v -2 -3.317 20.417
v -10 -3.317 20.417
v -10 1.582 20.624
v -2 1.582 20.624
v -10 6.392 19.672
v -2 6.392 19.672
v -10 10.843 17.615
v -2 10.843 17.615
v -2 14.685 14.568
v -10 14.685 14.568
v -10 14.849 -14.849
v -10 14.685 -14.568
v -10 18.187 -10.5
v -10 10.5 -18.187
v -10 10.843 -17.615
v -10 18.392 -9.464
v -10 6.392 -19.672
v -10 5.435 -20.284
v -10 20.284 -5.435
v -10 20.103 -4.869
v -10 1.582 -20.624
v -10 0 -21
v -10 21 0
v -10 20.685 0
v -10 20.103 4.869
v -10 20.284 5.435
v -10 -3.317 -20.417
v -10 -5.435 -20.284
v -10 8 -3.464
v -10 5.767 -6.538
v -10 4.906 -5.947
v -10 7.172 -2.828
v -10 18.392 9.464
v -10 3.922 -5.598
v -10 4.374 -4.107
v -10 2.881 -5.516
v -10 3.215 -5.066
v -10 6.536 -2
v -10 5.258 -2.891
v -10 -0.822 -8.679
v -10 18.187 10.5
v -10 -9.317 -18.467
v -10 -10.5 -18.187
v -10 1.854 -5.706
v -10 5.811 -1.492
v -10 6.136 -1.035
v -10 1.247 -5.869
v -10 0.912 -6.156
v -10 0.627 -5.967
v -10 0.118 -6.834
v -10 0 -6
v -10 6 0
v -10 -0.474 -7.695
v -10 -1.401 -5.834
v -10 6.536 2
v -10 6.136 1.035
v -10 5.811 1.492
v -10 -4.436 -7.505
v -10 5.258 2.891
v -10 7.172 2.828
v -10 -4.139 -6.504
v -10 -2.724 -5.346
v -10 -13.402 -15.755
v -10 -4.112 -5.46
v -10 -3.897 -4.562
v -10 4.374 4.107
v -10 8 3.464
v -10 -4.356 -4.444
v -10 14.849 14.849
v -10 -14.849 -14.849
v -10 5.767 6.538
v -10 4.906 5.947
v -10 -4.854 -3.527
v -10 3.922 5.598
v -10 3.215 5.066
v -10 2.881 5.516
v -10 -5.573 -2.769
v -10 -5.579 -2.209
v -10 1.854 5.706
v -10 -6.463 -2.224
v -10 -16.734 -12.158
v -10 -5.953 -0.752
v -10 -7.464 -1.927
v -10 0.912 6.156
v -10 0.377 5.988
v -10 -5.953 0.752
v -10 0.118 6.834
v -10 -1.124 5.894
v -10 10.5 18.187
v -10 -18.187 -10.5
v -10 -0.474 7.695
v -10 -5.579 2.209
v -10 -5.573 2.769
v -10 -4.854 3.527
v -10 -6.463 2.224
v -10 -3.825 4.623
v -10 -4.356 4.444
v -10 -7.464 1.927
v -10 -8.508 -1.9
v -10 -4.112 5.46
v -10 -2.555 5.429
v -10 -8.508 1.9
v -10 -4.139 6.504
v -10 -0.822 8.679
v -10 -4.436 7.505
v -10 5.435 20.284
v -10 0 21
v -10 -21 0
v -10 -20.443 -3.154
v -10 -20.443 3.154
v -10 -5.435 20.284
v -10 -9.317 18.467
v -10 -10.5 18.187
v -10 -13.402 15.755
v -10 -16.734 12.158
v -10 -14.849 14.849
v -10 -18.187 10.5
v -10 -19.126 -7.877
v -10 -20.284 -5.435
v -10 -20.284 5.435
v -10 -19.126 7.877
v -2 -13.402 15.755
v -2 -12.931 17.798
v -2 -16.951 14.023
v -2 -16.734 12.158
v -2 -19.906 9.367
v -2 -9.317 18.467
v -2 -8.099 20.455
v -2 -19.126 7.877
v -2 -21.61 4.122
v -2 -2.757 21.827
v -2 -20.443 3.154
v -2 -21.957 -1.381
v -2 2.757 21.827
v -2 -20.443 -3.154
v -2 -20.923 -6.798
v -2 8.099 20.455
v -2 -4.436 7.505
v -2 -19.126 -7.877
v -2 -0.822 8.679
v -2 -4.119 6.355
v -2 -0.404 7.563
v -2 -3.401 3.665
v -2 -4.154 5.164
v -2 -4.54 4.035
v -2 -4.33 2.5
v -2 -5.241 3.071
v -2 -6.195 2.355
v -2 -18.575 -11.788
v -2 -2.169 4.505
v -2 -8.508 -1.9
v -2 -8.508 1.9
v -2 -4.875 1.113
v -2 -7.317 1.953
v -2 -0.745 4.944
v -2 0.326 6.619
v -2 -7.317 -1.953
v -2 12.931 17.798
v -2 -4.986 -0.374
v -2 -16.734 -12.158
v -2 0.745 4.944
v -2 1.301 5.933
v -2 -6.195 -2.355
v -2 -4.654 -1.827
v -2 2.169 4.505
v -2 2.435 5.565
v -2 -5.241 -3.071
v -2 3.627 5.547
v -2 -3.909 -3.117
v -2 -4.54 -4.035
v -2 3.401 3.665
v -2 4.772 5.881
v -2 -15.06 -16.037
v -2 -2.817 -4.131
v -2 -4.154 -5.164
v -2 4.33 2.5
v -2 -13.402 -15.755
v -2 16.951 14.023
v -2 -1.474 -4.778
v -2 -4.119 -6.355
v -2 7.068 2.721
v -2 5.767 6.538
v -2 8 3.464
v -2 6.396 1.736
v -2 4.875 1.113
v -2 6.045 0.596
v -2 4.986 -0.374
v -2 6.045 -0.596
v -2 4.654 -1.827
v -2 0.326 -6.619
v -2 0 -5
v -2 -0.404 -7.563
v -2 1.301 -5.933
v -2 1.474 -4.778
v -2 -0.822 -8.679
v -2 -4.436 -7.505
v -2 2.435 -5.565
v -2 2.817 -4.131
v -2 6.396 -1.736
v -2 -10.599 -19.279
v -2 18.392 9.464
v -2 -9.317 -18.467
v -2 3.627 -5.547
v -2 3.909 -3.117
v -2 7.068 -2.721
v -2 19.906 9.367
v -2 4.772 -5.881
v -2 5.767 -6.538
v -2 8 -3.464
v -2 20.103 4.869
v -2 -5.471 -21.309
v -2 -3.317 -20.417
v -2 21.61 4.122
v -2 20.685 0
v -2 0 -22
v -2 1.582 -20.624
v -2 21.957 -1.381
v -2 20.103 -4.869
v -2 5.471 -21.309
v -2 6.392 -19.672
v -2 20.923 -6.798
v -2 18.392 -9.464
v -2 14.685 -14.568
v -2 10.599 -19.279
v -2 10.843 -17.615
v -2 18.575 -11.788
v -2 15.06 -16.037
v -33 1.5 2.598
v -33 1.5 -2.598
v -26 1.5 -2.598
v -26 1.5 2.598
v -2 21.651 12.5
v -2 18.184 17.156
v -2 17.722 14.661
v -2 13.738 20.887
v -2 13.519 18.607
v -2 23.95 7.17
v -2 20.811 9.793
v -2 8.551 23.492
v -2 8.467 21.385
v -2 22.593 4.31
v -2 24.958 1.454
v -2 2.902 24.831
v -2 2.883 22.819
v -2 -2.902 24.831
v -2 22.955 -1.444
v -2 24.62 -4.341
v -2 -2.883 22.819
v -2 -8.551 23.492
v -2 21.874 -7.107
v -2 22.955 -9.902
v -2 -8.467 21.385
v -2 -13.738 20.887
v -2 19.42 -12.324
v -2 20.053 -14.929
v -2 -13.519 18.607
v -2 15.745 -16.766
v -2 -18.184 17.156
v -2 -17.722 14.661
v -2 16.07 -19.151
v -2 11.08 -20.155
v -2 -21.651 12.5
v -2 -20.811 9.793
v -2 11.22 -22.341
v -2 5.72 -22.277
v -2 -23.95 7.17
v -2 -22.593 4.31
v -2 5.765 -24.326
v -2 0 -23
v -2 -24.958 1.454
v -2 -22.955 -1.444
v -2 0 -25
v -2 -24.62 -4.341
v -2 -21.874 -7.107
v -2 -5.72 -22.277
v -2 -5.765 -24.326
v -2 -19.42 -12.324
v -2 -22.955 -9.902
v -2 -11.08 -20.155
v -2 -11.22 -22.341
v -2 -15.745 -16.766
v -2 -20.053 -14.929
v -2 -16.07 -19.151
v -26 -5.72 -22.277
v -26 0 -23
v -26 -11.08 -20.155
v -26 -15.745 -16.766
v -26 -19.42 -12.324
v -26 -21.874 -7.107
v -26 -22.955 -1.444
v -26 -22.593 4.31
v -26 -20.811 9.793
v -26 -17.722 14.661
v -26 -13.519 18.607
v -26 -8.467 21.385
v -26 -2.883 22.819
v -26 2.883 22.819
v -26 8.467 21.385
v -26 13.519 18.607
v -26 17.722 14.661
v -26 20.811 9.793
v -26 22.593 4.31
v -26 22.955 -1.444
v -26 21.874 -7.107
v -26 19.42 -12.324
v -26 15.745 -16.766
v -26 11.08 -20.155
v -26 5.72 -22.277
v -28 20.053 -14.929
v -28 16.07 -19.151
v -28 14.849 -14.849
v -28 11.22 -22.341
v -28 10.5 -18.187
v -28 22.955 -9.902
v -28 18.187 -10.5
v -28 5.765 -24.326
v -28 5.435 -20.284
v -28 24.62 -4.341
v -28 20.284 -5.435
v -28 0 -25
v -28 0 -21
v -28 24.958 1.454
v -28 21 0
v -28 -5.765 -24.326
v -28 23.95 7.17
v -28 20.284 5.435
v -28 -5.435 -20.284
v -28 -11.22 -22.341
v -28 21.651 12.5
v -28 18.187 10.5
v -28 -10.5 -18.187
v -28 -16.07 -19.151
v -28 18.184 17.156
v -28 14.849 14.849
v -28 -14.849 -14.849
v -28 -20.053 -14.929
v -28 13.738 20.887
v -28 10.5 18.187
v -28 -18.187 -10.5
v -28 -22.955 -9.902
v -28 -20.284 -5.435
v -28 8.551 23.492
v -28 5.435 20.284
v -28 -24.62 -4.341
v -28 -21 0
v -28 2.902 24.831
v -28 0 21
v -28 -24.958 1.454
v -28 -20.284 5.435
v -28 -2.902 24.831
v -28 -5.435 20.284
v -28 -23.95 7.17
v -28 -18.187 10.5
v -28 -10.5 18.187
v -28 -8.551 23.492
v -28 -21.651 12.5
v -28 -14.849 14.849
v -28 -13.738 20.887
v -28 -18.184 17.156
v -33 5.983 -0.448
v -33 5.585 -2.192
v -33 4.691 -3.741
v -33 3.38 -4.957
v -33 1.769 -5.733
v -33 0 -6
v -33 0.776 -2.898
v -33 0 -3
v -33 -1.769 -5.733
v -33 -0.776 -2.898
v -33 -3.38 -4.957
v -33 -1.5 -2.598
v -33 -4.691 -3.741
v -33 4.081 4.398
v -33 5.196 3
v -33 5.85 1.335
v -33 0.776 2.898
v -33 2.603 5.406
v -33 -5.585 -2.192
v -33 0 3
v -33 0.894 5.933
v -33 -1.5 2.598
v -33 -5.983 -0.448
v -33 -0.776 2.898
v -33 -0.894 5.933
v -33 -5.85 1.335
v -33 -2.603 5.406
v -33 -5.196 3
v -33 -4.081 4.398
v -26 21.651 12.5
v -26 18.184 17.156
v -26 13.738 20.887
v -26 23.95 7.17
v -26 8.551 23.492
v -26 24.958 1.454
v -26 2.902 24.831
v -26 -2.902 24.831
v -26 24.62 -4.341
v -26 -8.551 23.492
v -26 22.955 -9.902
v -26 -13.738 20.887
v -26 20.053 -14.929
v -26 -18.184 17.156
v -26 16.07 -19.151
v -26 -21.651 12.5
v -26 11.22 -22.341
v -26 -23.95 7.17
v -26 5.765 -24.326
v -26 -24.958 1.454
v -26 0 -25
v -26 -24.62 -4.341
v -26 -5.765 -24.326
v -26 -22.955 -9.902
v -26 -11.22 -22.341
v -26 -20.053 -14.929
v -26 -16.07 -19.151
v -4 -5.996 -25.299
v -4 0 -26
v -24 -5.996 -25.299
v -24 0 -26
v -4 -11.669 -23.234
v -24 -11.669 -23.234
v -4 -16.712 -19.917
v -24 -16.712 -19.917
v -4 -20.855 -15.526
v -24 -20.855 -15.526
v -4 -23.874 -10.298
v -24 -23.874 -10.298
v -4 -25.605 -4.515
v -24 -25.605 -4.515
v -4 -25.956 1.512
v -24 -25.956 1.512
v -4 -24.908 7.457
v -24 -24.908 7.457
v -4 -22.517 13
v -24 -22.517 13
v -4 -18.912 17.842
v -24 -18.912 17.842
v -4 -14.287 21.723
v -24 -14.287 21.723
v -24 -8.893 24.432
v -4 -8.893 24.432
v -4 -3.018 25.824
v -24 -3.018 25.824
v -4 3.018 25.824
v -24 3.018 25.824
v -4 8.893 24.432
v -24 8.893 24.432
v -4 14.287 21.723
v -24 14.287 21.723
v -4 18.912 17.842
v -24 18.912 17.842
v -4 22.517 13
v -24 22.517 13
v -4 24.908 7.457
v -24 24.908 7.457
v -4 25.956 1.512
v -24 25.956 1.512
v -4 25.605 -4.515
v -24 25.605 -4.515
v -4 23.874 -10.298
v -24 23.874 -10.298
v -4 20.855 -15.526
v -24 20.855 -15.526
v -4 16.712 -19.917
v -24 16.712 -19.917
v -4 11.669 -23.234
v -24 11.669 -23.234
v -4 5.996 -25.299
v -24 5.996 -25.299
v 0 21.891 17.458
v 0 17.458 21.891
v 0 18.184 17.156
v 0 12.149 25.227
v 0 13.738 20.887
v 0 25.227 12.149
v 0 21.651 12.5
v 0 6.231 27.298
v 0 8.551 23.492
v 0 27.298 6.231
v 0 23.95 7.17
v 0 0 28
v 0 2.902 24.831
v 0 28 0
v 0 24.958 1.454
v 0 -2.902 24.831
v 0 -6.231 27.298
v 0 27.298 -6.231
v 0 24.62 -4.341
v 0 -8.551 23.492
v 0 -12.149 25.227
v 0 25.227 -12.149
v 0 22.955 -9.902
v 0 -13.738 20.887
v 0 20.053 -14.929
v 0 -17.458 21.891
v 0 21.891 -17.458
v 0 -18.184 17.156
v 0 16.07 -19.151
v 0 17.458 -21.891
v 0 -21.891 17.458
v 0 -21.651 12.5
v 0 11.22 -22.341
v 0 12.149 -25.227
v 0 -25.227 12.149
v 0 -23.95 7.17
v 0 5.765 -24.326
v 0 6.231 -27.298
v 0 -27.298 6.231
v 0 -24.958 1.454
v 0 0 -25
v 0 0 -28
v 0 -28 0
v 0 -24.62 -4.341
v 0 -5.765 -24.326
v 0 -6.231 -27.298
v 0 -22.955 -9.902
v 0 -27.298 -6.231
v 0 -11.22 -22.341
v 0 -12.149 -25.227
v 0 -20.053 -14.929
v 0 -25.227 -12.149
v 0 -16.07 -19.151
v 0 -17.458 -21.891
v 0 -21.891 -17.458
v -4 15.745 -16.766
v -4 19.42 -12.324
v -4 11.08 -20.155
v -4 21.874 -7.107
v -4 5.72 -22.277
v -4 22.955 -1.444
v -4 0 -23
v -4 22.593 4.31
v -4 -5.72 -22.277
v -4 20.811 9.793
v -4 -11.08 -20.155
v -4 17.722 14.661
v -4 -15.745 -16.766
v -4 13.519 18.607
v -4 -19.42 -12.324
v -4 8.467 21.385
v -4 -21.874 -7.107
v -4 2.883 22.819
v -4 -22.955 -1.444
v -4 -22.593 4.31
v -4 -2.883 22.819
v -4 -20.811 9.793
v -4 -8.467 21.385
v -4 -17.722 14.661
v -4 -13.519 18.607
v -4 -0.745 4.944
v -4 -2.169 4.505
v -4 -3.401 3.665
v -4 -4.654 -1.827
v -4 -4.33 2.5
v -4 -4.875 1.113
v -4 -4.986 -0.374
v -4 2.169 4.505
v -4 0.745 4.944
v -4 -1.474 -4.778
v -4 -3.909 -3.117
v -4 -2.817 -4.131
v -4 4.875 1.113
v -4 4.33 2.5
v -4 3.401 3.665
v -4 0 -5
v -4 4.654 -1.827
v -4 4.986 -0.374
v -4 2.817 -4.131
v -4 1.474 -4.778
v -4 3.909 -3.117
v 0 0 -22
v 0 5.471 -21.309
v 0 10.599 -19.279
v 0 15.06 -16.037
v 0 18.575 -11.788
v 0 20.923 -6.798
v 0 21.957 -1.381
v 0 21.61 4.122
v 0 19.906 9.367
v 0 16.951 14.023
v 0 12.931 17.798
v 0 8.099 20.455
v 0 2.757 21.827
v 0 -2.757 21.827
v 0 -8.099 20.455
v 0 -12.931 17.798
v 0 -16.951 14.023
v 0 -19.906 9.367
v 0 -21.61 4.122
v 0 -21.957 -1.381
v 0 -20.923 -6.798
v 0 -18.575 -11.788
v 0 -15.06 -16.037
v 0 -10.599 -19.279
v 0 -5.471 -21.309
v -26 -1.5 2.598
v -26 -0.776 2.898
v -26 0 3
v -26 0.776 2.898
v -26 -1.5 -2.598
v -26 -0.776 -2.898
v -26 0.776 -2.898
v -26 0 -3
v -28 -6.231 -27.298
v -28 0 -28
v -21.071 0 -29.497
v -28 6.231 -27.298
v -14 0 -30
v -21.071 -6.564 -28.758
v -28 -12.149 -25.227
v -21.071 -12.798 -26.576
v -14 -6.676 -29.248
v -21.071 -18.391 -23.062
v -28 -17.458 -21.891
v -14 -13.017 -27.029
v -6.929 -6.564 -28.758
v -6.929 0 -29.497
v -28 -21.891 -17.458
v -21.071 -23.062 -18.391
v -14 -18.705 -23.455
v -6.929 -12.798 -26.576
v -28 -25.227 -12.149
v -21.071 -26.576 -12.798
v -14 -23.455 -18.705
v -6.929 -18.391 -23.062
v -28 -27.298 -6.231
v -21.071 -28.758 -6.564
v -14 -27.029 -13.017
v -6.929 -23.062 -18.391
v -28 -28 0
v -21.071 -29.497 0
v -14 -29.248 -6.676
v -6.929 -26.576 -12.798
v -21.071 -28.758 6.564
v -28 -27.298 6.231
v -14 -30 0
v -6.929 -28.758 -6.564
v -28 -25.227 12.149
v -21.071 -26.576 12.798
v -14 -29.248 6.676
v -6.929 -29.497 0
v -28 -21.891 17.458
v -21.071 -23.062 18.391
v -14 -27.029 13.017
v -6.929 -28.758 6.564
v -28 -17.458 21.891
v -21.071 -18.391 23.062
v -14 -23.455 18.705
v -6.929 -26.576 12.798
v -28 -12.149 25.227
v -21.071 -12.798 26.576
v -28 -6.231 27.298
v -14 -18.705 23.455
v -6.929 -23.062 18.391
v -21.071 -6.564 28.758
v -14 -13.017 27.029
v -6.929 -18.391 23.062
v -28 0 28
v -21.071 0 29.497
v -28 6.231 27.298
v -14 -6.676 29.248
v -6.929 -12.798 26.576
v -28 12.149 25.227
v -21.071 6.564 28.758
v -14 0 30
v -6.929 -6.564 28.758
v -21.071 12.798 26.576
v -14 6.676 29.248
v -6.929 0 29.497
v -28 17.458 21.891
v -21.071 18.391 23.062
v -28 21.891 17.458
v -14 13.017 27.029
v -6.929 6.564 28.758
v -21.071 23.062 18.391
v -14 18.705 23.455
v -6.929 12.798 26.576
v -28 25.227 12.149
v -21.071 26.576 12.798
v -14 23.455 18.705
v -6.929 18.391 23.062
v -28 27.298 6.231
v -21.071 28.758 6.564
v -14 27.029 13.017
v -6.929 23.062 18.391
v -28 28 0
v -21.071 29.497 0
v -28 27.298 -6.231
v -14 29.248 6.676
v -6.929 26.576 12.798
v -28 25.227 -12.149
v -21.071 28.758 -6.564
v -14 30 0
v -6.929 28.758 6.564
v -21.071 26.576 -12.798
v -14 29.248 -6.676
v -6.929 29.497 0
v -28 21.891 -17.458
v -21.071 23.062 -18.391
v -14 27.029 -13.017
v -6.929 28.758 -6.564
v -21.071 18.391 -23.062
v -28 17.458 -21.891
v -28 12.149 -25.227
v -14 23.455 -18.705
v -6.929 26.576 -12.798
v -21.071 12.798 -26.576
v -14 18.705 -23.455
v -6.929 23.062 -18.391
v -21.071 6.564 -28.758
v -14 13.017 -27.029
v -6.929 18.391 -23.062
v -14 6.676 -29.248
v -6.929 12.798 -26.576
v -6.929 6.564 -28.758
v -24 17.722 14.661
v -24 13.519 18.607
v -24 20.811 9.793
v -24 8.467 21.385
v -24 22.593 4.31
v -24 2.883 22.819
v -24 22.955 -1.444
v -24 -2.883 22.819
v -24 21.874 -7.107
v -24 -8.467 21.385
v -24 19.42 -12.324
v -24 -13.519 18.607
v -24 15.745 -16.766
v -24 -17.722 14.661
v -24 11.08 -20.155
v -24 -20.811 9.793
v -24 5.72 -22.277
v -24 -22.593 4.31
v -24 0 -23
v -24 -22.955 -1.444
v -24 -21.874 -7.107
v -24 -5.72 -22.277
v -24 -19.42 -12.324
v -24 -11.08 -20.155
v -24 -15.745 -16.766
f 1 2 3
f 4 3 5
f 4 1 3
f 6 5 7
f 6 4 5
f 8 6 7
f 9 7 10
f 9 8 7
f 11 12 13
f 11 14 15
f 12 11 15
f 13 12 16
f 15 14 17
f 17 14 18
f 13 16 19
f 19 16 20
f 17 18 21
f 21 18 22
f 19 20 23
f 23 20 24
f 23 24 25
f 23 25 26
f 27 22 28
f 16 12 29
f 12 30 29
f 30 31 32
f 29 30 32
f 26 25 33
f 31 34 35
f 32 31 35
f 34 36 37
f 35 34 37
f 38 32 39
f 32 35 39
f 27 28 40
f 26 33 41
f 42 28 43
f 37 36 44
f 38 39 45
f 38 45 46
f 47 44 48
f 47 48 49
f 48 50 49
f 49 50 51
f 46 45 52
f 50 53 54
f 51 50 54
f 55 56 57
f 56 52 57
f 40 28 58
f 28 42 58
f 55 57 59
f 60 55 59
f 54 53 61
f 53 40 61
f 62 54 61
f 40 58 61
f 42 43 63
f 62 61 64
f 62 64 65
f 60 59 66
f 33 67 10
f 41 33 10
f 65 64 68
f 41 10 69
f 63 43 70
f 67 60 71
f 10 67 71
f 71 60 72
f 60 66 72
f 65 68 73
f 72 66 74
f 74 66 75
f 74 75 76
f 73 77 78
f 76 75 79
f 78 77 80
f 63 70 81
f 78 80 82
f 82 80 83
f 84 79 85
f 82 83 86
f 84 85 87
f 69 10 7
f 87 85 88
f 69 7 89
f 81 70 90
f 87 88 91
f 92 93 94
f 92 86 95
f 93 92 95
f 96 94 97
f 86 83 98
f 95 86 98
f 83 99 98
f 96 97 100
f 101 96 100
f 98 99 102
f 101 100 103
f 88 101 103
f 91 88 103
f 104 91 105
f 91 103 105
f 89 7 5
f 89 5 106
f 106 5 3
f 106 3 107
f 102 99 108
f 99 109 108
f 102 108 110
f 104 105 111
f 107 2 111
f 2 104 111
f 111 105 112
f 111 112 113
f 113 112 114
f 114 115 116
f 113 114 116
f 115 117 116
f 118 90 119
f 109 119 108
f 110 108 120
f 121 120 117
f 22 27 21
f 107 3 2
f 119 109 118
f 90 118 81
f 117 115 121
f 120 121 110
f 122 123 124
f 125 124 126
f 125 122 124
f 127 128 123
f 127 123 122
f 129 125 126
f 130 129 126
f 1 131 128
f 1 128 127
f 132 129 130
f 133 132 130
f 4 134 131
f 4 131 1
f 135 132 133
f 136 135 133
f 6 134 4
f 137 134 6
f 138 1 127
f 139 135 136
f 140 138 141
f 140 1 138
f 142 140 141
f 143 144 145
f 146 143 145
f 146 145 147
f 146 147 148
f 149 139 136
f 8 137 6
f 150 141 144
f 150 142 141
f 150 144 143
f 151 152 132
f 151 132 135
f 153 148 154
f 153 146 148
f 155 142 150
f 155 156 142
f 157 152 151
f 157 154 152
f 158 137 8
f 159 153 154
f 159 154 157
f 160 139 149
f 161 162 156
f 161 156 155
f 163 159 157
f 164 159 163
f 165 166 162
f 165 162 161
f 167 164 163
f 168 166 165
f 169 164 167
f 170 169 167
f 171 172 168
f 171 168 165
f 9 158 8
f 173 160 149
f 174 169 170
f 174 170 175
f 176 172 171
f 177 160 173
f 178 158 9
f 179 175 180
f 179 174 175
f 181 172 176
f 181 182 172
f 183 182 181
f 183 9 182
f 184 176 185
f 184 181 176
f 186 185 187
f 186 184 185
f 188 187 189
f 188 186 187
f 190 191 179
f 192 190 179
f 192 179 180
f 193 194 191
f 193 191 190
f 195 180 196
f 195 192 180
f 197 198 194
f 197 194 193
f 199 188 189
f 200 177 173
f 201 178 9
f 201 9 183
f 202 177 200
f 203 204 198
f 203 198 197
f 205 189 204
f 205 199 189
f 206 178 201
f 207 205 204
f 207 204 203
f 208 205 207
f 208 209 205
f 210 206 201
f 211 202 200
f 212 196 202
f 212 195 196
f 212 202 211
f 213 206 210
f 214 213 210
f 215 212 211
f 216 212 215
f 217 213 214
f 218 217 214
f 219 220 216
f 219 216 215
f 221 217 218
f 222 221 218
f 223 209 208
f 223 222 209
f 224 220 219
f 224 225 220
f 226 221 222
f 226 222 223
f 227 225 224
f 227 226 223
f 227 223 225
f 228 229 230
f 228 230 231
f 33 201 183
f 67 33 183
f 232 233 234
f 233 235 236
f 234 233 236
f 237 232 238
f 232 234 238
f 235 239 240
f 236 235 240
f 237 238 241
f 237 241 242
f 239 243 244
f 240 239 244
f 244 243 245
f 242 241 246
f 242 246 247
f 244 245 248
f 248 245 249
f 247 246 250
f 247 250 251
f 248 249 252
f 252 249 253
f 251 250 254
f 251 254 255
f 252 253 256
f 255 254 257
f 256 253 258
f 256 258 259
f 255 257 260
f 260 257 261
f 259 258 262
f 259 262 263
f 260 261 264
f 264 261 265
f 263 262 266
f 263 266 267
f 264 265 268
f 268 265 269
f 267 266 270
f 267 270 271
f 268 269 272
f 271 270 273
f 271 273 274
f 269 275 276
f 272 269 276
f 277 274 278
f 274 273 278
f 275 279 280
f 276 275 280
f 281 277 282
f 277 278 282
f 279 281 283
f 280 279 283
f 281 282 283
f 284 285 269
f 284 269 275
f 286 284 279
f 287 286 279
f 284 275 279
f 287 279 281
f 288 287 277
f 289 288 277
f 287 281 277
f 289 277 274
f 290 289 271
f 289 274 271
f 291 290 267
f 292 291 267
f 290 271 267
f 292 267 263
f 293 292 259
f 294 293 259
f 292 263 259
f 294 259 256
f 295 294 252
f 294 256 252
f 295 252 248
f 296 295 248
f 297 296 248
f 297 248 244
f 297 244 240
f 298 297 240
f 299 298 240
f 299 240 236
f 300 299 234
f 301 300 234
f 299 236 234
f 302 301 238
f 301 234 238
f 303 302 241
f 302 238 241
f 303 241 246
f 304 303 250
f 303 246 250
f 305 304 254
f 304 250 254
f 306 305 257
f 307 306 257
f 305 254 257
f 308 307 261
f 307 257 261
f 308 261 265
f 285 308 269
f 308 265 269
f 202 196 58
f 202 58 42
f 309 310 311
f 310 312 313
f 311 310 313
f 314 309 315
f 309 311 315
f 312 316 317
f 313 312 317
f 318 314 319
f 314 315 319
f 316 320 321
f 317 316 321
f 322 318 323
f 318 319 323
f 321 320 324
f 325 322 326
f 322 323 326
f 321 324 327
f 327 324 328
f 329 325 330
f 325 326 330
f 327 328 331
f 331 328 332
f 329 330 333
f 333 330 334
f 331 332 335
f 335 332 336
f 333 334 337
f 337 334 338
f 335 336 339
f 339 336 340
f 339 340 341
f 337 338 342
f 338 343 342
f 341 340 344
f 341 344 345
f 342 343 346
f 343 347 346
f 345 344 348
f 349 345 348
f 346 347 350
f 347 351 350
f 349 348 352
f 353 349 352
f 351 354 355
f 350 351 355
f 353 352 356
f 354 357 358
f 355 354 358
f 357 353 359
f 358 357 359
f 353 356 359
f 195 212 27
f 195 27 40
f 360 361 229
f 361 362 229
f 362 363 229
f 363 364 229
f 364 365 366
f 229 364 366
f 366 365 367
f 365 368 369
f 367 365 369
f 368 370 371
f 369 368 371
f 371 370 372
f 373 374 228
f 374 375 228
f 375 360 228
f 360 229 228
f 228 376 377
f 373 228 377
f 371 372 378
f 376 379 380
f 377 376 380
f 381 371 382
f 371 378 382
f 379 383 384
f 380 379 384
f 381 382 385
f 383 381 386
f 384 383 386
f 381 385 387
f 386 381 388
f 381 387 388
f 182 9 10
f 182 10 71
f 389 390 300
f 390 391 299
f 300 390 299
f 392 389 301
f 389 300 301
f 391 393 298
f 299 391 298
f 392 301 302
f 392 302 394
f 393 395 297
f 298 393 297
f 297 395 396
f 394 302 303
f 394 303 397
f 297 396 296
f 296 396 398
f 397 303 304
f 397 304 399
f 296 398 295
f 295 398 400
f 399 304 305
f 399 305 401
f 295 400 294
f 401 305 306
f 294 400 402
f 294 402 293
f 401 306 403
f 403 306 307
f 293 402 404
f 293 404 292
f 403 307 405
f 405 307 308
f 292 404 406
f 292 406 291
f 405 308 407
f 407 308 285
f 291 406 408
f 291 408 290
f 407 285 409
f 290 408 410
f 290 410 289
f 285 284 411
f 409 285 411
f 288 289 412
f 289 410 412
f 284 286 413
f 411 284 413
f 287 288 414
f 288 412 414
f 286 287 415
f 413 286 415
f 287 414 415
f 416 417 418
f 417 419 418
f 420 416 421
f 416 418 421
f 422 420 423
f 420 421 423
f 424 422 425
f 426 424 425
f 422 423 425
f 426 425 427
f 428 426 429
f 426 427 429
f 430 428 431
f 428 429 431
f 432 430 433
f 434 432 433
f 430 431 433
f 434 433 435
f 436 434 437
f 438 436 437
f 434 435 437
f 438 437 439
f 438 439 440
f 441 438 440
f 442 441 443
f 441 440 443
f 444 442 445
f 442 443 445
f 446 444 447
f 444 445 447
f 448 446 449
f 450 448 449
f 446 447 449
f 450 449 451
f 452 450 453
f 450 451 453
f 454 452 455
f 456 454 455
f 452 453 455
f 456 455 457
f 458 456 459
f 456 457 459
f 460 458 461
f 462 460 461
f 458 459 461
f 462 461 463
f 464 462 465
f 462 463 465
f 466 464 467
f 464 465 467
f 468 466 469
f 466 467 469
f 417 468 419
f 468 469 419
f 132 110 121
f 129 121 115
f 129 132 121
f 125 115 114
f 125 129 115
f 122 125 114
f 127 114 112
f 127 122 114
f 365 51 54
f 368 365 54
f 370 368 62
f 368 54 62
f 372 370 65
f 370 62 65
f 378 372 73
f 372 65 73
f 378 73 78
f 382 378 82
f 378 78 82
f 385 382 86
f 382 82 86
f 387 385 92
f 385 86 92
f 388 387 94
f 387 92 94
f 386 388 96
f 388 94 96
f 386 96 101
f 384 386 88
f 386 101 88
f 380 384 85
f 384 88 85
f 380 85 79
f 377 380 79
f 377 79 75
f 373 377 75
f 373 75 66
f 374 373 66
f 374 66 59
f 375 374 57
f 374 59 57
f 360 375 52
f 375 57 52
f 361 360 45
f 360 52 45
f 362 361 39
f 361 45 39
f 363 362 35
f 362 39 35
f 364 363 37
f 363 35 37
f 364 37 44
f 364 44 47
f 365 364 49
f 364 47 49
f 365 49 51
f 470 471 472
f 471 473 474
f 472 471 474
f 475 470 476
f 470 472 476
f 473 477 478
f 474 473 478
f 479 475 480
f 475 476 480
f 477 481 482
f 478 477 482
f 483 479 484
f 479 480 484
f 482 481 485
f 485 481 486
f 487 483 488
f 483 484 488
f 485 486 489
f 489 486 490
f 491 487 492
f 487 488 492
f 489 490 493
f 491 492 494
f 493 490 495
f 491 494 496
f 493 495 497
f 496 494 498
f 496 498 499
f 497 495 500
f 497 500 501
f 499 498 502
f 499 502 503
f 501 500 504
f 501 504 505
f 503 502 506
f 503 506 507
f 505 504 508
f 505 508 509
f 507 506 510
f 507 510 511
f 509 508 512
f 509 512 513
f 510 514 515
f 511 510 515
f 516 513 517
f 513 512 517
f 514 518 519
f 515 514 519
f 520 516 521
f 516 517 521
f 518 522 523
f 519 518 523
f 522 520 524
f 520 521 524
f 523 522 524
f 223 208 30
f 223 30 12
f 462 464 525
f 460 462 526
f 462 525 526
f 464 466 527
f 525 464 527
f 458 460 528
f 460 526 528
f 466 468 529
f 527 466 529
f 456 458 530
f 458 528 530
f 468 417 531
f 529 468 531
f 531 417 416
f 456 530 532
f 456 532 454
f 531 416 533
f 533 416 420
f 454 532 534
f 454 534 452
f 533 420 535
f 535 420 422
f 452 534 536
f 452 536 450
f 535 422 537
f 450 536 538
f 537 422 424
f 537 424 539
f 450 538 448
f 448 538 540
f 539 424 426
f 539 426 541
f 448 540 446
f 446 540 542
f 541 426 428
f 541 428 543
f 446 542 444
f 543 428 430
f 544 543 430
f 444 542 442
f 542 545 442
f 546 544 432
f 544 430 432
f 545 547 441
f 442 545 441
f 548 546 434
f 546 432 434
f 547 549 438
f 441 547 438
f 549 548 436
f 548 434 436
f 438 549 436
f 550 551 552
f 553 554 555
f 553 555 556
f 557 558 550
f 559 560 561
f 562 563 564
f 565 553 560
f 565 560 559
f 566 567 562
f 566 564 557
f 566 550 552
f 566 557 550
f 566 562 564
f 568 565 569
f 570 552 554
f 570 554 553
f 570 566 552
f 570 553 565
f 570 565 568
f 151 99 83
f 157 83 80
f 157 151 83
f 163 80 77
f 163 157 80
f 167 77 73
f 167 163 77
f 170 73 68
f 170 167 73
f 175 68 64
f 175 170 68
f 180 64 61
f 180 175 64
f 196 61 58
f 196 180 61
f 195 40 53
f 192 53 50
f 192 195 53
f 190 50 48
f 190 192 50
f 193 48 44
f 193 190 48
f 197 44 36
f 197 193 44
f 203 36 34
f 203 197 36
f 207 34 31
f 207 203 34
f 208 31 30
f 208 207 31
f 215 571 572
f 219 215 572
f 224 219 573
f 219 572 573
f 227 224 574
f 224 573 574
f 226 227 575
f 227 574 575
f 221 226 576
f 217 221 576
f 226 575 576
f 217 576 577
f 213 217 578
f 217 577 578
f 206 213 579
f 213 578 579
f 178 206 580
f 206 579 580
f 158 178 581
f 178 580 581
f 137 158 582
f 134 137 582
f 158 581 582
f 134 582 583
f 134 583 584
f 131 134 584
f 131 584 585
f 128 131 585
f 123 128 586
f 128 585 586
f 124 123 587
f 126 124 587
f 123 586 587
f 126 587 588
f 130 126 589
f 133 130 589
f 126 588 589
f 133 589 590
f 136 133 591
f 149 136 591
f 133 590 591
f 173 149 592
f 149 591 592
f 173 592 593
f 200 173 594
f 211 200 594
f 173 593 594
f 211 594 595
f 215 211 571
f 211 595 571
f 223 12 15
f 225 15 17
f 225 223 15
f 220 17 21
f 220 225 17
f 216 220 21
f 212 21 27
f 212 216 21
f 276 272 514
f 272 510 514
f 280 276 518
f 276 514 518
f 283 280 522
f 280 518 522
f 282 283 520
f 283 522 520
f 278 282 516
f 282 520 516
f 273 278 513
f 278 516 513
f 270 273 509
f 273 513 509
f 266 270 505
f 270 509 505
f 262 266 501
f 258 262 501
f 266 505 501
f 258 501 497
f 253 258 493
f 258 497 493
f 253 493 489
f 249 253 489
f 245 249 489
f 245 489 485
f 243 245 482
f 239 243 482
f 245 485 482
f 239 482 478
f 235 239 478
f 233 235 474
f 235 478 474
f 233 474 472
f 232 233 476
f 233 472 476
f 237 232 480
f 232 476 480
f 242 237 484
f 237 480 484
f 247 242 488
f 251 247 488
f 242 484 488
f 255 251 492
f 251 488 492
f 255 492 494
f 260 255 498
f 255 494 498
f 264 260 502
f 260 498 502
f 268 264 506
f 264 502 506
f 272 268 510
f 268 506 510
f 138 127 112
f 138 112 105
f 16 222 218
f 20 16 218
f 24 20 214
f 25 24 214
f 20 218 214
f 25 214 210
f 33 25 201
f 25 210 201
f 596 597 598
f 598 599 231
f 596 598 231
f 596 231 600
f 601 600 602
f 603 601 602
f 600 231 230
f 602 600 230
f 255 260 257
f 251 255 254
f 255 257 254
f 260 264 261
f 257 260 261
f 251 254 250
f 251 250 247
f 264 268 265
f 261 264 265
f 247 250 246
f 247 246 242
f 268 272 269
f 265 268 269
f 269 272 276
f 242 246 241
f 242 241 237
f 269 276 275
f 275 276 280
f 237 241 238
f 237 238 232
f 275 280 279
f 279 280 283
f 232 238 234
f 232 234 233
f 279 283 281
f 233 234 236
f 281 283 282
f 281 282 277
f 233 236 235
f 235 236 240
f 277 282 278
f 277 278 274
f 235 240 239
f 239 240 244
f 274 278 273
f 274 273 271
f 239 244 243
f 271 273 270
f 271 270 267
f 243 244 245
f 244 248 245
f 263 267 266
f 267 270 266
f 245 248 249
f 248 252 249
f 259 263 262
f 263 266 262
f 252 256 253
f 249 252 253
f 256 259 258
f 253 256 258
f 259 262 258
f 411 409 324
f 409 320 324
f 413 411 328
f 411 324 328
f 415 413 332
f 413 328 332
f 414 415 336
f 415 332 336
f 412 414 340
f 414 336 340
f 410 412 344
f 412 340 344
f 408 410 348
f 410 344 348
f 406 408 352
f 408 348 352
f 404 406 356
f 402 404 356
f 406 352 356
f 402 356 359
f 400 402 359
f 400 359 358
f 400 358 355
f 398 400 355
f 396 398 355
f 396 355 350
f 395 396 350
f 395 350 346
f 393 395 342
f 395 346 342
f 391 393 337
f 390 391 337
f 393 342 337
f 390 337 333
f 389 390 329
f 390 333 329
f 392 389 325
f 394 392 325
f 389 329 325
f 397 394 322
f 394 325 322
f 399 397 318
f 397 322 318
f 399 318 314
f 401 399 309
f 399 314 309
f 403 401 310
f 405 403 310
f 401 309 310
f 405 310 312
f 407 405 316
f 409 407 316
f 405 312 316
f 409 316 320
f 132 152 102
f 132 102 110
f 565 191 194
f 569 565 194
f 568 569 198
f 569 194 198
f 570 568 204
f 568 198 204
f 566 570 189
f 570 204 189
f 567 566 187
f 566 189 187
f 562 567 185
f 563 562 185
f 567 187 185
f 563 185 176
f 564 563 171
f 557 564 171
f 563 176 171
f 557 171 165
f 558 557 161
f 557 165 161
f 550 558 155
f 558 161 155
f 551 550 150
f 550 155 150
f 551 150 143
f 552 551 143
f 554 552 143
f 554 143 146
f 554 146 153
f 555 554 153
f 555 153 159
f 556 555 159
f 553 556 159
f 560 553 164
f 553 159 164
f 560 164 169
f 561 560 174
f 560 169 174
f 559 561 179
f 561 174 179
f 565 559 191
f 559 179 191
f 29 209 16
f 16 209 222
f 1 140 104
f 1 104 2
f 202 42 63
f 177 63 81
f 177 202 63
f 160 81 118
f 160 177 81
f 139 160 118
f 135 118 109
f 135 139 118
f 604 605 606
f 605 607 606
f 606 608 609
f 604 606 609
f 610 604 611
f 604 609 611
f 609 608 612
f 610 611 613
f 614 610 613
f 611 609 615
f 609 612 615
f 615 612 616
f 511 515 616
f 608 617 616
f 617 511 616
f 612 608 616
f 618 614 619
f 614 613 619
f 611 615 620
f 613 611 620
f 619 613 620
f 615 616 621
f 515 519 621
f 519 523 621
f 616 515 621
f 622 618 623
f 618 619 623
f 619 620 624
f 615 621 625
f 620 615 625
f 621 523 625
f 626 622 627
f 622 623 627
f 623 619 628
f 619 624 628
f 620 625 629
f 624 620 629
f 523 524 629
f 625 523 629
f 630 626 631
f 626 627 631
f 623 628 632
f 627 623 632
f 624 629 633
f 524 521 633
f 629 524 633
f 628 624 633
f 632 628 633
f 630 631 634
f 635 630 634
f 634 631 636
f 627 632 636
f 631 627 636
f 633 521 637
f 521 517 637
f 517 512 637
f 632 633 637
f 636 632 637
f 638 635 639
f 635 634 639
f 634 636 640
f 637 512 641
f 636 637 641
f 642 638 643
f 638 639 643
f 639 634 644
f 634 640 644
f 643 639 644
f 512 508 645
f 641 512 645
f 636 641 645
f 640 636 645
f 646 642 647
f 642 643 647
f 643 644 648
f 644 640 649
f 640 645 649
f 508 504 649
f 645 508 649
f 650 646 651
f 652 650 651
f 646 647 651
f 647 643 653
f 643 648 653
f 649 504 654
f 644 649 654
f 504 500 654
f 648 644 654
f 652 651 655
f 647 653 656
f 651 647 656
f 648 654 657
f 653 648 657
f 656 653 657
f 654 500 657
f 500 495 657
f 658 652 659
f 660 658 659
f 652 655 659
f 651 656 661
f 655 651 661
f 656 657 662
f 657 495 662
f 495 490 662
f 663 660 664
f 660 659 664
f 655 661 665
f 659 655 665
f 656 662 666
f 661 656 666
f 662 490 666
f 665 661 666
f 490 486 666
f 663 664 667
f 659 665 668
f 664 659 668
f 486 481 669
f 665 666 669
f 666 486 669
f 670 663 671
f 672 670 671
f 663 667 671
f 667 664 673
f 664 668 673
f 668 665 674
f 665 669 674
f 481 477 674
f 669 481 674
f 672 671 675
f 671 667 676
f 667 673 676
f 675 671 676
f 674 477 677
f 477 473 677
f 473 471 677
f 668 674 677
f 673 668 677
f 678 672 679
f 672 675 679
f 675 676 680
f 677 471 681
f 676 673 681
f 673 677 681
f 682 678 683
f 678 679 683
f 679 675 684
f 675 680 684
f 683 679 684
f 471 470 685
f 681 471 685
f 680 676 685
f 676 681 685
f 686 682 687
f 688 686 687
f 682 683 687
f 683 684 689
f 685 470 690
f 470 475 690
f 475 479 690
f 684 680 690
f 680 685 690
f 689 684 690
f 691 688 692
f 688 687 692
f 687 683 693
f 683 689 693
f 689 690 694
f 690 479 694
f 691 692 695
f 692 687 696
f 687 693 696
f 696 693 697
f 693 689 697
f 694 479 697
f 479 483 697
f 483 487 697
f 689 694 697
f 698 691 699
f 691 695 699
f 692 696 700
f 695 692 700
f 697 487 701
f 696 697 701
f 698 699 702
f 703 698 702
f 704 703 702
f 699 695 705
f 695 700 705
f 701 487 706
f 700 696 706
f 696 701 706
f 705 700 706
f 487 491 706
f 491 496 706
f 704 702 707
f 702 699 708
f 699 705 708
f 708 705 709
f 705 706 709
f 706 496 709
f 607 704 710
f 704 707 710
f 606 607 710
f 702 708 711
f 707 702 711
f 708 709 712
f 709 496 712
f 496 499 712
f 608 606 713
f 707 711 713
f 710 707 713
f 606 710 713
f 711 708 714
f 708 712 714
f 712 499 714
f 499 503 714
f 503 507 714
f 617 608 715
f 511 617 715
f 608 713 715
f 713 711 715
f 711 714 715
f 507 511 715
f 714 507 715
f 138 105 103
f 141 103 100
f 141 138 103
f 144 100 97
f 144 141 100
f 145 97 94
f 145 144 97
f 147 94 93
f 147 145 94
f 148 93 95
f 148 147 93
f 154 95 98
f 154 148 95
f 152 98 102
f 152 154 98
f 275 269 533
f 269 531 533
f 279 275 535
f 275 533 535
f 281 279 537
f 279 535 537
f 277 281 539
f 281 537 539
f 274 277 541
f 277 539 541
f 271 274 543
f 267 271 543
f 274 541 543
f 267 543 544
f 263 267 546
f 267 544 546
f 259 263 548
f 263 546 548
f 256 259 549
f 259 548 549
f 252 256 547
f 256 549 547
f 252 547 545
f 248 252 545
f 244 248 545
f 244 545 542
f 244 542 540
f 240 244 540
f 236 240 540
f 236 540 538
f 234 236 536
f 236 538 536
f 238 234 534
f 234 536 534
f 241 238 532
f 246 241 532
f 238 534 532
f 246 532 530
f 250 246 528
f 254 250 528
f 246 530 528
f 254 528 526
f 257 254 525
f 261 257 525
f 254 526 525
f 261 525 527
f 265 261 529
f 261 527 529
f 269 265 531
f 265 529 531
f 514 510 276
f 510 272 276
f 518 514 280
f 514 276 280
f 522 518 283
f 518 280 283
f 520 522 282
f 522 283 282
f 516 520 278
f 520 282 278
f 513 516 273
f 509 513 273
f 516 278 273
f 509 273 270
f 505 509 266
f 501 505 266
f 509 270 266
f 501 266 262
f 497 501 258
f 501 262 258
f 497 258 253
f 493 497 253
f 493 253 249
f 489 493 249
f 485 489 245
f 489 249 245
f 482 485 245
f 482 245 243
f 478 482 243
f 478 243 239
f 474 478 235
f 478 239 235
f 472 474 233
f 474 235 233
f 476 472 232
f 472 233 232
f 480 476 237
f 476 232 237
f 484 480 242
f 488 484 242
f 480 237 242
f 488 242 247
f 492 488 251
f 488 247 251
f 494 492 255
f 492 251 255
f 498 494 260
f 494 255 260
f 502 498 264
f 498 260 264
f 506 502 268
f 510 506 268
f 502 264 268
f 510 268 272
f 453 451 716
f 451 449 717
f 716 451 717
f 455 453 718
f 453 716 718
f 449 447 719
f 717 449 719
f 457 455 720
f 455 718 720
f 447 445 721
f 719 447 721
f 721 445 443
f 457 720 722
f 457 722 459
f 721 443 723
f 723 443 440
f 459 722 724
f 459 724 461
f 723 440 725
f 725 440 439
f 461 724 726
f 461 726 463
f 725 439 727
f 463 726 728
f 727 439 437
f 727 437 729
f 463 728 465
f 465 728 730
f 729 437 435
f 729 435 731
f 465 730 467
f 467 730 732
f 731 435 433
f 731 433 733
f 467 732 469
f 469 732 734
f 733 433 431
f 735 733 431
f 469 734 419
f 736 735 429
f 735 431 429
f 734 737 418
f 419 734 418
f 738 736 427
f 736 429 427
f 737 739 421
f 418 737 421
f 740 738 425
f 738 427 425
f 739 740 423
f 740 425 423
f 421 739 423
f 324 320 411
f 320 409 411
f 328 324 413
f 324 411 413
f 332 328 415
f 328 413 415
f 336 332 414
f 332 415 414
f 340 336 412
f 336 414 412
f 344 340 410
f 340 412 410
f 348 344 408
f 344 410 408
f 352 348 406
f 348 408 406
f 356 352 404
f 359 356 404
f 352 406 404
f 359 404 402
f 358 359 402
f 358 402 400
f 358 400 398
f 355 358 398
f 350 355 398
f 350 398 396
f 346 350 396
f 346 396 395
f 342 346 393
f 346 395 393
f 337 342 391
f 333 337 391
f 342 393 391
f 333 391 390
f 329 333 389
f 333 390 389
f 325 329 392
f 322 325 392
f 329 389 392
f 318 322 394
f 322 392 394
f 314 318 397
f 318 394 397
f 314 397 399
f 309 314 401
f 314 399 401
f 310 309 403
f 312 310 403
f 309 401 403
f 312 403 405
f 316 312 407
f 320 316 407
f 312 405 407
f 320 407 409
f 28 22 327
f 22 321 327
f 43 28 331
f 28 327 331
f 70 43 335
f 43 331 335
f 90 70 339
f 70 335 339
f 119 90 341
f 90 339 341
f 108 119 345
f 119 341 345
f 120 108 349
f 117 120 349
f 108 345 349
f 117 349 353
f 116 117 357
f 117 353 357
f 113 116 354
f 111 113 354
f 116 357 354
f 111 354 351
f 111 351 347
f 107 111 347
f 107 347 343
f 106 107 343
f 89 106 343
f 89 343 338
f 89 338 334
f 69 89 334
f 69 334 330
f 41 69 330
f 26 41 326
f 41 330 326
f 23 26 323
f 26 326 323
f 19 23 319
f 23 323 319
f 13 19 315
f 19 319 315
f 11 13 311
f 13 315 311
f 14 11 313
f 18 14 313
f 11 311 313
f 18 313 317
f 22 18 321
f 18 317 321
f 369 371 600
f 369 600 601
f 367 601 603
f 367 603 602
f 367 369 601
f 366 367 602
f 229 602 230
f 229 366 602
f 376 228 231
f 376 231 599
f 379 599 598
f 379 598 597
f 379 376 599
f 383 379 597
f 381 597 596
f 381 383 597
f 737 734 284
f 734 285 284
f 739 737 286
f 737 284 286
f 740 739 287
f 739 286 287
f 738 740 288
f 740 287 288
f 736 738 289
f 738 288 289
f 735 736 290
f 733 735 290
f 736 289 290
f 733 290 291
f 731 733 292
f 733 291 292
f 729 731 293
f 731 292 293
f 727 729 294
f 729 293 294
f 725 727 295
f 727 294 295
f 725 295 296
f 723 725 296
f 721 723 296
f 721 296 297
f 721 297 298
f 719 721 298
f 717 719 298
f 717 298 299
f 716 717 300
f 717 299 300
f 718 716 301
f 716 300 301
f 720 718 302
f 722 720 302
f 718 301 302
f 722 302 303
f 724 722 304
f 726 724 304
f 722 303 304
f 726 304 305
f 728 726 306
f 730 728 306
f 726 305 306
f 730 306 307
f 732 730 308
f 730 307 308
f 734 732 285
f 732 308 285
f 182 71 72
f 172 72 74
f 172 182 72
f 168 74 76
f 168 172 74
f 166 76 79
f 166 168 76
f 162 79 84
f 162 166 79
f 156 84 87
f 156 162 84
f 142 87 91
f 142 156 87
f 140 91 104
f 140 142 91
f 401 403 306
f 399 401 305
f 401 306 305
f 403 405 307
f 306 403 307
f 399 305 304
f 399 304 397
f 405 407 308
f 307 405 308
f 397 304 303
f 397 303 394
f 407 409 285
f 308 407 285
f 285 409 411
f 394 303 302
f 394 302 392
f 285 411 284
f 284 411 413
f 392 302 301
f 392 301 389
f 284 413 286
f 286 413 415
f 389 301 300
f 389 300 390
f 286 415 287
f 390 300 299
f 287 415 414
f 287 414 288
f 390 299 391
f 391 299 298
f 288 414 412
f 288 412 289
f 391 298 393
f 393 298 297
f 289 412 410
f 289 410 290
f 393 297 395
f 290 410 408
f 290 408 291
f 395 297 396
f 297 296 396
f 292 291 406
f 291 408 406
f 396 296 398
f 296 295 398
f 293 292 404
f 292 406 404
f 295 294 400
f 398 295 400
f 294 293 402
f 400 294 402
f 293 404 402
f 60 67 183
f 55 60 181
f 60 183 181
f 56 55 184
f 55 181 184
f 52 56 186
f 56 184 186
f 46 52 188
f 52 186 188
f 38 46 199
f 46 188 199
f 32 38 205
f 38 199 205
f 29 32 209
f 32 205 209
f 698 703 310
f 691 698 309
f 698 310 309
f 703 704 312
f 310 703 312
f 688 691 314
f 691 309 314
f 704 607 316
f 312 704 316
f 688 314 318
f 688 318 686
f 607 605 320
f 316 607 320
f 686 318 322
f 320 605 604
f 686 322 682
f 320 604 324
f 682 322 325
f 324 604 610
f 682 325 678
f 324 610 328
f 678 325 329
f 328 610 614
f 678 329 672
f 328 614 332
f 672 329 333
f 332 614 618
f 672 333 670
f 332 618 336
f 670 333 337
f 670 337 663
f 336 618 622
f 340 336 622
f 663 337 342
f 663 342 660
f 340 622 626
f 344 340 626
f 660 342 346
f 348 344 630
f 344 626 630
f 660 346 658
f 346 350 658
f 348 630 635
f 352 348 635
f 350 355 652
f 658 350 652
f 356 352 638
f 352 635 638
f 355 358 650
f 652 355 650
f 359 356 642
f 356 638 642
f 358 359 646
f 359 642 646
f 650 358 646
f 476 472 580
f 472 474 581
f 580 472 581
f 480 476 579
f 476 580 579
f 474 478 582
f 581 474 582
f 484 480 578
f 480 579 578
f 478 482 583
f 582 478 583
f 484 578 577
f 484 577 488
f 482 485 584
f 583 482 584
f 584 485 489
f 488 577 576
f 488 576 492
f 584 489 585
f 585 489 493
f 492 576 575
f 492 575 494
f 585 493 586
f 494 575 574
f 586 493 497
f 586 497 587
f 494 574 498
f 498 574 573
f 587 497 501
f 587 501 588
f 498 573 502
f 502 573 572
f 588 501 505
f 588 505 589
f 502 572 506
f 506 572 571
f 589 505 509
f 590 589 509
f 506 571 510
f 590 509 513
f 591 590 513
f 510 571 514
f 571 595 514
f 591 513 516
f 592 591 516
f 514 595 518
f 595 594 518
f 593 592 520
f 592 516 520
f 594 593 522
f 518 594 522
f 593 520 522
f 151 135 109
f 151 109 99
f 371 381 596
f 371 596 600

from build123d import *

# Parameters (mm, degrees)
SKETCH3_R          = 22
CUT_EXTRUDE1_DEPTH = 2
CUT_EXTRUDE2_DEPTH = 48.021271782
SKETCH4_R          = 5
CUT_EXTRUDE3_DEPTH = 2
CUT_EXTRUDE4_DEPTH = 7


with BuildPart() as part:
    # Sketch1 → Revolve1 (revolve)
    with BuildSketch(Plane.XY, mode=Mode.PRIVATE) as revolve1_sk:
        Polygon((0, 0), (-33, 0), (-33, 6), (-10, 6), (-10, 21), (-28, 21), (-28, 25), (-26, 25), (-26, 23), (-2, 23), (-2, 25), (0, 25), align=None)
    revolve(revolve1_sk.sketch.rotate(Axis((0, 0, 0), (-1, 0, 0)), 90), axis=Axis((0, 0, 0), (-1, 0, 0)))

    # Sketch3 → Cut-Extrude1 (cut)
    with BuildSketch(Plane(origin=(0, 0, 0), x_dir=(0, 0, -1), z_dir=(1, 0, 0))):
        Circle(SKETCH3_R)
    extrude(amount=-CUT_EXTRUDE1_DEPTH, mode=Mode.SUBTRACT)

    # Sketch2 → Cut-Extrude2 (cut, through all)
    with BuildSketch(Plane(origin=(-2, 0, 0), x_dir=(0, 0, -1), z_dir=(1, 0, 0))):
        with BuildLine():
            Line((-9.464163606, 18.392340636), (-3.464163606, 8.00003579))
            ThreePointArc((-3.464163606, 8.00003579), (0, 6), (3.464163606, 8.00003579))
            Line((3.464163606, 8.00003579), (9.464163606, 18.392340636))
            ThreePointArc((9.464163606, 18.392340636), (0, 20.684501126), (-9.464163606, 18.392340636))
        make_face()
        with BuildLine():
            Line((20.416742803, -3.317408646), (8.678971594, -0.822468356))
            ThreePointArc((8.678971594, -0.822468356), (5.706339098, 1.854101966), (6.538000743, 5.766762385))
            Line((6.538000743, 5.766762385), (14.56756802, 14.684500291))
            ThreePointArc((14.56756802, 14.684500291), (19.672129582, 6.391862368), (20.416742803, -3.317408646))
        make_face()
        with BuildLine():
            Line((3.154077386, -20.442611933), (1.899735827, -8.508349189))
            ThreePointArc((1.899735827, -8.508349189), (3.526711514, -4.854101966), (7.504870284, -4.435980631))
            Line((7.504870284, -4.435980631), (18.467415775, -9.316820348))
            ThreePointArc((18.467415775, -9.316820348), (12.158044713, -16.734112931), (3.154077386, -20.442611933))
        make_face()
        with BuildLine():
            Line((-18.467415775, -9.316820348), (-7.504870284, -4.435980631))
            ThreePointArc((-7.504870284, -4.435980631), (-3.526711514, -4.854101966), (-1.899735827, -8.508349189))
            Line((-1.899735827, -8.508349189), (-3.154077386, -20.442611933))
            ThreePointArc((-3.154077386, -20.442611933), (-12.158044713, -16.734112931), (-18.467415775, -9.316820348))
        make_face()
        with BuildLine():
            Line((-14.56756802, 14.684500291), (-6.538000743, 5.766762385))
            ThreePointArc((-6.538000743, 5.766762385), (-5.706339098, 1.854101966), (-8.678971594, -0.822468356))
            Line((-8.678971594, -0.822468356), (-20.416742803, -3.317408646))
            ThreePointArc((-20.416742803, -3.317408646), (-19.672129582, 6.391862368), (-14.56756802, 14.684500291))
        make_face()
    extrude(amount=-CUT_EXTRUDE2_DEPTH, mode=Mode.SUBTRACT)

    # Sketch4 → Cut-Extrude3 (cut)
    with BuildSketch(Plane(origin=(-2, 0, 0), x_dir=(0, 0, -1), z_dir=(1, 0, 0))):
        Circle(SKETCH4_R)
    extrude(amount=-CUT_EXTRUDE3_DEPTH, mode=Mode.SUBTRACT)

    # Sketch5 → Cut-Extrude4 (cut)
    with BuildSketch(Plane.ZY.offset(33)):
        with BuildLine():
            Line((-2.598076211, 1.5), (2.598076211, 1.5))
            ThreePointArc((2.598076211, 1.5), (3, 0), (2.598076211, -1.5))
            Line((2.598076211, -1.5), (-2.598076211, -1.5))
            ThreePointArc((-2.598076211, -1.5), (-3, 0), (-2.598076211, 1.5))
        make_face()
    extrude(amount=-CUT_EXTRUDE4_DEPTH, mode=Mode.SUBTRACT)


with BuildPart() as body_2:
    # Sketch7 → Revolve3 (revolve)
    with BuildSketch(Plane.XY, mode=Mode.PRIVATE) as revolve3_sk:
        with BuildLine():
            Line((-14, 26), (-24, 26))
            Line((-24, 26), (-24, 23))
            Line((-24, 23), (-26, 23))
            Line((-26, 23), (-26, 25))
            Line((-26, 25), (-28, 25))
            Line((-28, 25), (-28, 28))
            ThreePointArc((-28, 28), (-14, 30), (0, 28))
            Line((0, 28), (0, 25))
            Line((0, 25), (-2, 25))
            Line((-2, 25), (-2, 23))
            Line((-2, 23), (-4, 23))
            Line((-4, 23), (-4, 26))
            Line((-4, 26), (-14, 26))
        make_face()
    revolve(revolve3_sk.sketch.rotate(Axis((0, 0, 0), (-1, 0, 0)), 90), axis=Axis((0, 0, 0), (-1, 0, 0)))


solid = Compound([part.part, body_2.part])
